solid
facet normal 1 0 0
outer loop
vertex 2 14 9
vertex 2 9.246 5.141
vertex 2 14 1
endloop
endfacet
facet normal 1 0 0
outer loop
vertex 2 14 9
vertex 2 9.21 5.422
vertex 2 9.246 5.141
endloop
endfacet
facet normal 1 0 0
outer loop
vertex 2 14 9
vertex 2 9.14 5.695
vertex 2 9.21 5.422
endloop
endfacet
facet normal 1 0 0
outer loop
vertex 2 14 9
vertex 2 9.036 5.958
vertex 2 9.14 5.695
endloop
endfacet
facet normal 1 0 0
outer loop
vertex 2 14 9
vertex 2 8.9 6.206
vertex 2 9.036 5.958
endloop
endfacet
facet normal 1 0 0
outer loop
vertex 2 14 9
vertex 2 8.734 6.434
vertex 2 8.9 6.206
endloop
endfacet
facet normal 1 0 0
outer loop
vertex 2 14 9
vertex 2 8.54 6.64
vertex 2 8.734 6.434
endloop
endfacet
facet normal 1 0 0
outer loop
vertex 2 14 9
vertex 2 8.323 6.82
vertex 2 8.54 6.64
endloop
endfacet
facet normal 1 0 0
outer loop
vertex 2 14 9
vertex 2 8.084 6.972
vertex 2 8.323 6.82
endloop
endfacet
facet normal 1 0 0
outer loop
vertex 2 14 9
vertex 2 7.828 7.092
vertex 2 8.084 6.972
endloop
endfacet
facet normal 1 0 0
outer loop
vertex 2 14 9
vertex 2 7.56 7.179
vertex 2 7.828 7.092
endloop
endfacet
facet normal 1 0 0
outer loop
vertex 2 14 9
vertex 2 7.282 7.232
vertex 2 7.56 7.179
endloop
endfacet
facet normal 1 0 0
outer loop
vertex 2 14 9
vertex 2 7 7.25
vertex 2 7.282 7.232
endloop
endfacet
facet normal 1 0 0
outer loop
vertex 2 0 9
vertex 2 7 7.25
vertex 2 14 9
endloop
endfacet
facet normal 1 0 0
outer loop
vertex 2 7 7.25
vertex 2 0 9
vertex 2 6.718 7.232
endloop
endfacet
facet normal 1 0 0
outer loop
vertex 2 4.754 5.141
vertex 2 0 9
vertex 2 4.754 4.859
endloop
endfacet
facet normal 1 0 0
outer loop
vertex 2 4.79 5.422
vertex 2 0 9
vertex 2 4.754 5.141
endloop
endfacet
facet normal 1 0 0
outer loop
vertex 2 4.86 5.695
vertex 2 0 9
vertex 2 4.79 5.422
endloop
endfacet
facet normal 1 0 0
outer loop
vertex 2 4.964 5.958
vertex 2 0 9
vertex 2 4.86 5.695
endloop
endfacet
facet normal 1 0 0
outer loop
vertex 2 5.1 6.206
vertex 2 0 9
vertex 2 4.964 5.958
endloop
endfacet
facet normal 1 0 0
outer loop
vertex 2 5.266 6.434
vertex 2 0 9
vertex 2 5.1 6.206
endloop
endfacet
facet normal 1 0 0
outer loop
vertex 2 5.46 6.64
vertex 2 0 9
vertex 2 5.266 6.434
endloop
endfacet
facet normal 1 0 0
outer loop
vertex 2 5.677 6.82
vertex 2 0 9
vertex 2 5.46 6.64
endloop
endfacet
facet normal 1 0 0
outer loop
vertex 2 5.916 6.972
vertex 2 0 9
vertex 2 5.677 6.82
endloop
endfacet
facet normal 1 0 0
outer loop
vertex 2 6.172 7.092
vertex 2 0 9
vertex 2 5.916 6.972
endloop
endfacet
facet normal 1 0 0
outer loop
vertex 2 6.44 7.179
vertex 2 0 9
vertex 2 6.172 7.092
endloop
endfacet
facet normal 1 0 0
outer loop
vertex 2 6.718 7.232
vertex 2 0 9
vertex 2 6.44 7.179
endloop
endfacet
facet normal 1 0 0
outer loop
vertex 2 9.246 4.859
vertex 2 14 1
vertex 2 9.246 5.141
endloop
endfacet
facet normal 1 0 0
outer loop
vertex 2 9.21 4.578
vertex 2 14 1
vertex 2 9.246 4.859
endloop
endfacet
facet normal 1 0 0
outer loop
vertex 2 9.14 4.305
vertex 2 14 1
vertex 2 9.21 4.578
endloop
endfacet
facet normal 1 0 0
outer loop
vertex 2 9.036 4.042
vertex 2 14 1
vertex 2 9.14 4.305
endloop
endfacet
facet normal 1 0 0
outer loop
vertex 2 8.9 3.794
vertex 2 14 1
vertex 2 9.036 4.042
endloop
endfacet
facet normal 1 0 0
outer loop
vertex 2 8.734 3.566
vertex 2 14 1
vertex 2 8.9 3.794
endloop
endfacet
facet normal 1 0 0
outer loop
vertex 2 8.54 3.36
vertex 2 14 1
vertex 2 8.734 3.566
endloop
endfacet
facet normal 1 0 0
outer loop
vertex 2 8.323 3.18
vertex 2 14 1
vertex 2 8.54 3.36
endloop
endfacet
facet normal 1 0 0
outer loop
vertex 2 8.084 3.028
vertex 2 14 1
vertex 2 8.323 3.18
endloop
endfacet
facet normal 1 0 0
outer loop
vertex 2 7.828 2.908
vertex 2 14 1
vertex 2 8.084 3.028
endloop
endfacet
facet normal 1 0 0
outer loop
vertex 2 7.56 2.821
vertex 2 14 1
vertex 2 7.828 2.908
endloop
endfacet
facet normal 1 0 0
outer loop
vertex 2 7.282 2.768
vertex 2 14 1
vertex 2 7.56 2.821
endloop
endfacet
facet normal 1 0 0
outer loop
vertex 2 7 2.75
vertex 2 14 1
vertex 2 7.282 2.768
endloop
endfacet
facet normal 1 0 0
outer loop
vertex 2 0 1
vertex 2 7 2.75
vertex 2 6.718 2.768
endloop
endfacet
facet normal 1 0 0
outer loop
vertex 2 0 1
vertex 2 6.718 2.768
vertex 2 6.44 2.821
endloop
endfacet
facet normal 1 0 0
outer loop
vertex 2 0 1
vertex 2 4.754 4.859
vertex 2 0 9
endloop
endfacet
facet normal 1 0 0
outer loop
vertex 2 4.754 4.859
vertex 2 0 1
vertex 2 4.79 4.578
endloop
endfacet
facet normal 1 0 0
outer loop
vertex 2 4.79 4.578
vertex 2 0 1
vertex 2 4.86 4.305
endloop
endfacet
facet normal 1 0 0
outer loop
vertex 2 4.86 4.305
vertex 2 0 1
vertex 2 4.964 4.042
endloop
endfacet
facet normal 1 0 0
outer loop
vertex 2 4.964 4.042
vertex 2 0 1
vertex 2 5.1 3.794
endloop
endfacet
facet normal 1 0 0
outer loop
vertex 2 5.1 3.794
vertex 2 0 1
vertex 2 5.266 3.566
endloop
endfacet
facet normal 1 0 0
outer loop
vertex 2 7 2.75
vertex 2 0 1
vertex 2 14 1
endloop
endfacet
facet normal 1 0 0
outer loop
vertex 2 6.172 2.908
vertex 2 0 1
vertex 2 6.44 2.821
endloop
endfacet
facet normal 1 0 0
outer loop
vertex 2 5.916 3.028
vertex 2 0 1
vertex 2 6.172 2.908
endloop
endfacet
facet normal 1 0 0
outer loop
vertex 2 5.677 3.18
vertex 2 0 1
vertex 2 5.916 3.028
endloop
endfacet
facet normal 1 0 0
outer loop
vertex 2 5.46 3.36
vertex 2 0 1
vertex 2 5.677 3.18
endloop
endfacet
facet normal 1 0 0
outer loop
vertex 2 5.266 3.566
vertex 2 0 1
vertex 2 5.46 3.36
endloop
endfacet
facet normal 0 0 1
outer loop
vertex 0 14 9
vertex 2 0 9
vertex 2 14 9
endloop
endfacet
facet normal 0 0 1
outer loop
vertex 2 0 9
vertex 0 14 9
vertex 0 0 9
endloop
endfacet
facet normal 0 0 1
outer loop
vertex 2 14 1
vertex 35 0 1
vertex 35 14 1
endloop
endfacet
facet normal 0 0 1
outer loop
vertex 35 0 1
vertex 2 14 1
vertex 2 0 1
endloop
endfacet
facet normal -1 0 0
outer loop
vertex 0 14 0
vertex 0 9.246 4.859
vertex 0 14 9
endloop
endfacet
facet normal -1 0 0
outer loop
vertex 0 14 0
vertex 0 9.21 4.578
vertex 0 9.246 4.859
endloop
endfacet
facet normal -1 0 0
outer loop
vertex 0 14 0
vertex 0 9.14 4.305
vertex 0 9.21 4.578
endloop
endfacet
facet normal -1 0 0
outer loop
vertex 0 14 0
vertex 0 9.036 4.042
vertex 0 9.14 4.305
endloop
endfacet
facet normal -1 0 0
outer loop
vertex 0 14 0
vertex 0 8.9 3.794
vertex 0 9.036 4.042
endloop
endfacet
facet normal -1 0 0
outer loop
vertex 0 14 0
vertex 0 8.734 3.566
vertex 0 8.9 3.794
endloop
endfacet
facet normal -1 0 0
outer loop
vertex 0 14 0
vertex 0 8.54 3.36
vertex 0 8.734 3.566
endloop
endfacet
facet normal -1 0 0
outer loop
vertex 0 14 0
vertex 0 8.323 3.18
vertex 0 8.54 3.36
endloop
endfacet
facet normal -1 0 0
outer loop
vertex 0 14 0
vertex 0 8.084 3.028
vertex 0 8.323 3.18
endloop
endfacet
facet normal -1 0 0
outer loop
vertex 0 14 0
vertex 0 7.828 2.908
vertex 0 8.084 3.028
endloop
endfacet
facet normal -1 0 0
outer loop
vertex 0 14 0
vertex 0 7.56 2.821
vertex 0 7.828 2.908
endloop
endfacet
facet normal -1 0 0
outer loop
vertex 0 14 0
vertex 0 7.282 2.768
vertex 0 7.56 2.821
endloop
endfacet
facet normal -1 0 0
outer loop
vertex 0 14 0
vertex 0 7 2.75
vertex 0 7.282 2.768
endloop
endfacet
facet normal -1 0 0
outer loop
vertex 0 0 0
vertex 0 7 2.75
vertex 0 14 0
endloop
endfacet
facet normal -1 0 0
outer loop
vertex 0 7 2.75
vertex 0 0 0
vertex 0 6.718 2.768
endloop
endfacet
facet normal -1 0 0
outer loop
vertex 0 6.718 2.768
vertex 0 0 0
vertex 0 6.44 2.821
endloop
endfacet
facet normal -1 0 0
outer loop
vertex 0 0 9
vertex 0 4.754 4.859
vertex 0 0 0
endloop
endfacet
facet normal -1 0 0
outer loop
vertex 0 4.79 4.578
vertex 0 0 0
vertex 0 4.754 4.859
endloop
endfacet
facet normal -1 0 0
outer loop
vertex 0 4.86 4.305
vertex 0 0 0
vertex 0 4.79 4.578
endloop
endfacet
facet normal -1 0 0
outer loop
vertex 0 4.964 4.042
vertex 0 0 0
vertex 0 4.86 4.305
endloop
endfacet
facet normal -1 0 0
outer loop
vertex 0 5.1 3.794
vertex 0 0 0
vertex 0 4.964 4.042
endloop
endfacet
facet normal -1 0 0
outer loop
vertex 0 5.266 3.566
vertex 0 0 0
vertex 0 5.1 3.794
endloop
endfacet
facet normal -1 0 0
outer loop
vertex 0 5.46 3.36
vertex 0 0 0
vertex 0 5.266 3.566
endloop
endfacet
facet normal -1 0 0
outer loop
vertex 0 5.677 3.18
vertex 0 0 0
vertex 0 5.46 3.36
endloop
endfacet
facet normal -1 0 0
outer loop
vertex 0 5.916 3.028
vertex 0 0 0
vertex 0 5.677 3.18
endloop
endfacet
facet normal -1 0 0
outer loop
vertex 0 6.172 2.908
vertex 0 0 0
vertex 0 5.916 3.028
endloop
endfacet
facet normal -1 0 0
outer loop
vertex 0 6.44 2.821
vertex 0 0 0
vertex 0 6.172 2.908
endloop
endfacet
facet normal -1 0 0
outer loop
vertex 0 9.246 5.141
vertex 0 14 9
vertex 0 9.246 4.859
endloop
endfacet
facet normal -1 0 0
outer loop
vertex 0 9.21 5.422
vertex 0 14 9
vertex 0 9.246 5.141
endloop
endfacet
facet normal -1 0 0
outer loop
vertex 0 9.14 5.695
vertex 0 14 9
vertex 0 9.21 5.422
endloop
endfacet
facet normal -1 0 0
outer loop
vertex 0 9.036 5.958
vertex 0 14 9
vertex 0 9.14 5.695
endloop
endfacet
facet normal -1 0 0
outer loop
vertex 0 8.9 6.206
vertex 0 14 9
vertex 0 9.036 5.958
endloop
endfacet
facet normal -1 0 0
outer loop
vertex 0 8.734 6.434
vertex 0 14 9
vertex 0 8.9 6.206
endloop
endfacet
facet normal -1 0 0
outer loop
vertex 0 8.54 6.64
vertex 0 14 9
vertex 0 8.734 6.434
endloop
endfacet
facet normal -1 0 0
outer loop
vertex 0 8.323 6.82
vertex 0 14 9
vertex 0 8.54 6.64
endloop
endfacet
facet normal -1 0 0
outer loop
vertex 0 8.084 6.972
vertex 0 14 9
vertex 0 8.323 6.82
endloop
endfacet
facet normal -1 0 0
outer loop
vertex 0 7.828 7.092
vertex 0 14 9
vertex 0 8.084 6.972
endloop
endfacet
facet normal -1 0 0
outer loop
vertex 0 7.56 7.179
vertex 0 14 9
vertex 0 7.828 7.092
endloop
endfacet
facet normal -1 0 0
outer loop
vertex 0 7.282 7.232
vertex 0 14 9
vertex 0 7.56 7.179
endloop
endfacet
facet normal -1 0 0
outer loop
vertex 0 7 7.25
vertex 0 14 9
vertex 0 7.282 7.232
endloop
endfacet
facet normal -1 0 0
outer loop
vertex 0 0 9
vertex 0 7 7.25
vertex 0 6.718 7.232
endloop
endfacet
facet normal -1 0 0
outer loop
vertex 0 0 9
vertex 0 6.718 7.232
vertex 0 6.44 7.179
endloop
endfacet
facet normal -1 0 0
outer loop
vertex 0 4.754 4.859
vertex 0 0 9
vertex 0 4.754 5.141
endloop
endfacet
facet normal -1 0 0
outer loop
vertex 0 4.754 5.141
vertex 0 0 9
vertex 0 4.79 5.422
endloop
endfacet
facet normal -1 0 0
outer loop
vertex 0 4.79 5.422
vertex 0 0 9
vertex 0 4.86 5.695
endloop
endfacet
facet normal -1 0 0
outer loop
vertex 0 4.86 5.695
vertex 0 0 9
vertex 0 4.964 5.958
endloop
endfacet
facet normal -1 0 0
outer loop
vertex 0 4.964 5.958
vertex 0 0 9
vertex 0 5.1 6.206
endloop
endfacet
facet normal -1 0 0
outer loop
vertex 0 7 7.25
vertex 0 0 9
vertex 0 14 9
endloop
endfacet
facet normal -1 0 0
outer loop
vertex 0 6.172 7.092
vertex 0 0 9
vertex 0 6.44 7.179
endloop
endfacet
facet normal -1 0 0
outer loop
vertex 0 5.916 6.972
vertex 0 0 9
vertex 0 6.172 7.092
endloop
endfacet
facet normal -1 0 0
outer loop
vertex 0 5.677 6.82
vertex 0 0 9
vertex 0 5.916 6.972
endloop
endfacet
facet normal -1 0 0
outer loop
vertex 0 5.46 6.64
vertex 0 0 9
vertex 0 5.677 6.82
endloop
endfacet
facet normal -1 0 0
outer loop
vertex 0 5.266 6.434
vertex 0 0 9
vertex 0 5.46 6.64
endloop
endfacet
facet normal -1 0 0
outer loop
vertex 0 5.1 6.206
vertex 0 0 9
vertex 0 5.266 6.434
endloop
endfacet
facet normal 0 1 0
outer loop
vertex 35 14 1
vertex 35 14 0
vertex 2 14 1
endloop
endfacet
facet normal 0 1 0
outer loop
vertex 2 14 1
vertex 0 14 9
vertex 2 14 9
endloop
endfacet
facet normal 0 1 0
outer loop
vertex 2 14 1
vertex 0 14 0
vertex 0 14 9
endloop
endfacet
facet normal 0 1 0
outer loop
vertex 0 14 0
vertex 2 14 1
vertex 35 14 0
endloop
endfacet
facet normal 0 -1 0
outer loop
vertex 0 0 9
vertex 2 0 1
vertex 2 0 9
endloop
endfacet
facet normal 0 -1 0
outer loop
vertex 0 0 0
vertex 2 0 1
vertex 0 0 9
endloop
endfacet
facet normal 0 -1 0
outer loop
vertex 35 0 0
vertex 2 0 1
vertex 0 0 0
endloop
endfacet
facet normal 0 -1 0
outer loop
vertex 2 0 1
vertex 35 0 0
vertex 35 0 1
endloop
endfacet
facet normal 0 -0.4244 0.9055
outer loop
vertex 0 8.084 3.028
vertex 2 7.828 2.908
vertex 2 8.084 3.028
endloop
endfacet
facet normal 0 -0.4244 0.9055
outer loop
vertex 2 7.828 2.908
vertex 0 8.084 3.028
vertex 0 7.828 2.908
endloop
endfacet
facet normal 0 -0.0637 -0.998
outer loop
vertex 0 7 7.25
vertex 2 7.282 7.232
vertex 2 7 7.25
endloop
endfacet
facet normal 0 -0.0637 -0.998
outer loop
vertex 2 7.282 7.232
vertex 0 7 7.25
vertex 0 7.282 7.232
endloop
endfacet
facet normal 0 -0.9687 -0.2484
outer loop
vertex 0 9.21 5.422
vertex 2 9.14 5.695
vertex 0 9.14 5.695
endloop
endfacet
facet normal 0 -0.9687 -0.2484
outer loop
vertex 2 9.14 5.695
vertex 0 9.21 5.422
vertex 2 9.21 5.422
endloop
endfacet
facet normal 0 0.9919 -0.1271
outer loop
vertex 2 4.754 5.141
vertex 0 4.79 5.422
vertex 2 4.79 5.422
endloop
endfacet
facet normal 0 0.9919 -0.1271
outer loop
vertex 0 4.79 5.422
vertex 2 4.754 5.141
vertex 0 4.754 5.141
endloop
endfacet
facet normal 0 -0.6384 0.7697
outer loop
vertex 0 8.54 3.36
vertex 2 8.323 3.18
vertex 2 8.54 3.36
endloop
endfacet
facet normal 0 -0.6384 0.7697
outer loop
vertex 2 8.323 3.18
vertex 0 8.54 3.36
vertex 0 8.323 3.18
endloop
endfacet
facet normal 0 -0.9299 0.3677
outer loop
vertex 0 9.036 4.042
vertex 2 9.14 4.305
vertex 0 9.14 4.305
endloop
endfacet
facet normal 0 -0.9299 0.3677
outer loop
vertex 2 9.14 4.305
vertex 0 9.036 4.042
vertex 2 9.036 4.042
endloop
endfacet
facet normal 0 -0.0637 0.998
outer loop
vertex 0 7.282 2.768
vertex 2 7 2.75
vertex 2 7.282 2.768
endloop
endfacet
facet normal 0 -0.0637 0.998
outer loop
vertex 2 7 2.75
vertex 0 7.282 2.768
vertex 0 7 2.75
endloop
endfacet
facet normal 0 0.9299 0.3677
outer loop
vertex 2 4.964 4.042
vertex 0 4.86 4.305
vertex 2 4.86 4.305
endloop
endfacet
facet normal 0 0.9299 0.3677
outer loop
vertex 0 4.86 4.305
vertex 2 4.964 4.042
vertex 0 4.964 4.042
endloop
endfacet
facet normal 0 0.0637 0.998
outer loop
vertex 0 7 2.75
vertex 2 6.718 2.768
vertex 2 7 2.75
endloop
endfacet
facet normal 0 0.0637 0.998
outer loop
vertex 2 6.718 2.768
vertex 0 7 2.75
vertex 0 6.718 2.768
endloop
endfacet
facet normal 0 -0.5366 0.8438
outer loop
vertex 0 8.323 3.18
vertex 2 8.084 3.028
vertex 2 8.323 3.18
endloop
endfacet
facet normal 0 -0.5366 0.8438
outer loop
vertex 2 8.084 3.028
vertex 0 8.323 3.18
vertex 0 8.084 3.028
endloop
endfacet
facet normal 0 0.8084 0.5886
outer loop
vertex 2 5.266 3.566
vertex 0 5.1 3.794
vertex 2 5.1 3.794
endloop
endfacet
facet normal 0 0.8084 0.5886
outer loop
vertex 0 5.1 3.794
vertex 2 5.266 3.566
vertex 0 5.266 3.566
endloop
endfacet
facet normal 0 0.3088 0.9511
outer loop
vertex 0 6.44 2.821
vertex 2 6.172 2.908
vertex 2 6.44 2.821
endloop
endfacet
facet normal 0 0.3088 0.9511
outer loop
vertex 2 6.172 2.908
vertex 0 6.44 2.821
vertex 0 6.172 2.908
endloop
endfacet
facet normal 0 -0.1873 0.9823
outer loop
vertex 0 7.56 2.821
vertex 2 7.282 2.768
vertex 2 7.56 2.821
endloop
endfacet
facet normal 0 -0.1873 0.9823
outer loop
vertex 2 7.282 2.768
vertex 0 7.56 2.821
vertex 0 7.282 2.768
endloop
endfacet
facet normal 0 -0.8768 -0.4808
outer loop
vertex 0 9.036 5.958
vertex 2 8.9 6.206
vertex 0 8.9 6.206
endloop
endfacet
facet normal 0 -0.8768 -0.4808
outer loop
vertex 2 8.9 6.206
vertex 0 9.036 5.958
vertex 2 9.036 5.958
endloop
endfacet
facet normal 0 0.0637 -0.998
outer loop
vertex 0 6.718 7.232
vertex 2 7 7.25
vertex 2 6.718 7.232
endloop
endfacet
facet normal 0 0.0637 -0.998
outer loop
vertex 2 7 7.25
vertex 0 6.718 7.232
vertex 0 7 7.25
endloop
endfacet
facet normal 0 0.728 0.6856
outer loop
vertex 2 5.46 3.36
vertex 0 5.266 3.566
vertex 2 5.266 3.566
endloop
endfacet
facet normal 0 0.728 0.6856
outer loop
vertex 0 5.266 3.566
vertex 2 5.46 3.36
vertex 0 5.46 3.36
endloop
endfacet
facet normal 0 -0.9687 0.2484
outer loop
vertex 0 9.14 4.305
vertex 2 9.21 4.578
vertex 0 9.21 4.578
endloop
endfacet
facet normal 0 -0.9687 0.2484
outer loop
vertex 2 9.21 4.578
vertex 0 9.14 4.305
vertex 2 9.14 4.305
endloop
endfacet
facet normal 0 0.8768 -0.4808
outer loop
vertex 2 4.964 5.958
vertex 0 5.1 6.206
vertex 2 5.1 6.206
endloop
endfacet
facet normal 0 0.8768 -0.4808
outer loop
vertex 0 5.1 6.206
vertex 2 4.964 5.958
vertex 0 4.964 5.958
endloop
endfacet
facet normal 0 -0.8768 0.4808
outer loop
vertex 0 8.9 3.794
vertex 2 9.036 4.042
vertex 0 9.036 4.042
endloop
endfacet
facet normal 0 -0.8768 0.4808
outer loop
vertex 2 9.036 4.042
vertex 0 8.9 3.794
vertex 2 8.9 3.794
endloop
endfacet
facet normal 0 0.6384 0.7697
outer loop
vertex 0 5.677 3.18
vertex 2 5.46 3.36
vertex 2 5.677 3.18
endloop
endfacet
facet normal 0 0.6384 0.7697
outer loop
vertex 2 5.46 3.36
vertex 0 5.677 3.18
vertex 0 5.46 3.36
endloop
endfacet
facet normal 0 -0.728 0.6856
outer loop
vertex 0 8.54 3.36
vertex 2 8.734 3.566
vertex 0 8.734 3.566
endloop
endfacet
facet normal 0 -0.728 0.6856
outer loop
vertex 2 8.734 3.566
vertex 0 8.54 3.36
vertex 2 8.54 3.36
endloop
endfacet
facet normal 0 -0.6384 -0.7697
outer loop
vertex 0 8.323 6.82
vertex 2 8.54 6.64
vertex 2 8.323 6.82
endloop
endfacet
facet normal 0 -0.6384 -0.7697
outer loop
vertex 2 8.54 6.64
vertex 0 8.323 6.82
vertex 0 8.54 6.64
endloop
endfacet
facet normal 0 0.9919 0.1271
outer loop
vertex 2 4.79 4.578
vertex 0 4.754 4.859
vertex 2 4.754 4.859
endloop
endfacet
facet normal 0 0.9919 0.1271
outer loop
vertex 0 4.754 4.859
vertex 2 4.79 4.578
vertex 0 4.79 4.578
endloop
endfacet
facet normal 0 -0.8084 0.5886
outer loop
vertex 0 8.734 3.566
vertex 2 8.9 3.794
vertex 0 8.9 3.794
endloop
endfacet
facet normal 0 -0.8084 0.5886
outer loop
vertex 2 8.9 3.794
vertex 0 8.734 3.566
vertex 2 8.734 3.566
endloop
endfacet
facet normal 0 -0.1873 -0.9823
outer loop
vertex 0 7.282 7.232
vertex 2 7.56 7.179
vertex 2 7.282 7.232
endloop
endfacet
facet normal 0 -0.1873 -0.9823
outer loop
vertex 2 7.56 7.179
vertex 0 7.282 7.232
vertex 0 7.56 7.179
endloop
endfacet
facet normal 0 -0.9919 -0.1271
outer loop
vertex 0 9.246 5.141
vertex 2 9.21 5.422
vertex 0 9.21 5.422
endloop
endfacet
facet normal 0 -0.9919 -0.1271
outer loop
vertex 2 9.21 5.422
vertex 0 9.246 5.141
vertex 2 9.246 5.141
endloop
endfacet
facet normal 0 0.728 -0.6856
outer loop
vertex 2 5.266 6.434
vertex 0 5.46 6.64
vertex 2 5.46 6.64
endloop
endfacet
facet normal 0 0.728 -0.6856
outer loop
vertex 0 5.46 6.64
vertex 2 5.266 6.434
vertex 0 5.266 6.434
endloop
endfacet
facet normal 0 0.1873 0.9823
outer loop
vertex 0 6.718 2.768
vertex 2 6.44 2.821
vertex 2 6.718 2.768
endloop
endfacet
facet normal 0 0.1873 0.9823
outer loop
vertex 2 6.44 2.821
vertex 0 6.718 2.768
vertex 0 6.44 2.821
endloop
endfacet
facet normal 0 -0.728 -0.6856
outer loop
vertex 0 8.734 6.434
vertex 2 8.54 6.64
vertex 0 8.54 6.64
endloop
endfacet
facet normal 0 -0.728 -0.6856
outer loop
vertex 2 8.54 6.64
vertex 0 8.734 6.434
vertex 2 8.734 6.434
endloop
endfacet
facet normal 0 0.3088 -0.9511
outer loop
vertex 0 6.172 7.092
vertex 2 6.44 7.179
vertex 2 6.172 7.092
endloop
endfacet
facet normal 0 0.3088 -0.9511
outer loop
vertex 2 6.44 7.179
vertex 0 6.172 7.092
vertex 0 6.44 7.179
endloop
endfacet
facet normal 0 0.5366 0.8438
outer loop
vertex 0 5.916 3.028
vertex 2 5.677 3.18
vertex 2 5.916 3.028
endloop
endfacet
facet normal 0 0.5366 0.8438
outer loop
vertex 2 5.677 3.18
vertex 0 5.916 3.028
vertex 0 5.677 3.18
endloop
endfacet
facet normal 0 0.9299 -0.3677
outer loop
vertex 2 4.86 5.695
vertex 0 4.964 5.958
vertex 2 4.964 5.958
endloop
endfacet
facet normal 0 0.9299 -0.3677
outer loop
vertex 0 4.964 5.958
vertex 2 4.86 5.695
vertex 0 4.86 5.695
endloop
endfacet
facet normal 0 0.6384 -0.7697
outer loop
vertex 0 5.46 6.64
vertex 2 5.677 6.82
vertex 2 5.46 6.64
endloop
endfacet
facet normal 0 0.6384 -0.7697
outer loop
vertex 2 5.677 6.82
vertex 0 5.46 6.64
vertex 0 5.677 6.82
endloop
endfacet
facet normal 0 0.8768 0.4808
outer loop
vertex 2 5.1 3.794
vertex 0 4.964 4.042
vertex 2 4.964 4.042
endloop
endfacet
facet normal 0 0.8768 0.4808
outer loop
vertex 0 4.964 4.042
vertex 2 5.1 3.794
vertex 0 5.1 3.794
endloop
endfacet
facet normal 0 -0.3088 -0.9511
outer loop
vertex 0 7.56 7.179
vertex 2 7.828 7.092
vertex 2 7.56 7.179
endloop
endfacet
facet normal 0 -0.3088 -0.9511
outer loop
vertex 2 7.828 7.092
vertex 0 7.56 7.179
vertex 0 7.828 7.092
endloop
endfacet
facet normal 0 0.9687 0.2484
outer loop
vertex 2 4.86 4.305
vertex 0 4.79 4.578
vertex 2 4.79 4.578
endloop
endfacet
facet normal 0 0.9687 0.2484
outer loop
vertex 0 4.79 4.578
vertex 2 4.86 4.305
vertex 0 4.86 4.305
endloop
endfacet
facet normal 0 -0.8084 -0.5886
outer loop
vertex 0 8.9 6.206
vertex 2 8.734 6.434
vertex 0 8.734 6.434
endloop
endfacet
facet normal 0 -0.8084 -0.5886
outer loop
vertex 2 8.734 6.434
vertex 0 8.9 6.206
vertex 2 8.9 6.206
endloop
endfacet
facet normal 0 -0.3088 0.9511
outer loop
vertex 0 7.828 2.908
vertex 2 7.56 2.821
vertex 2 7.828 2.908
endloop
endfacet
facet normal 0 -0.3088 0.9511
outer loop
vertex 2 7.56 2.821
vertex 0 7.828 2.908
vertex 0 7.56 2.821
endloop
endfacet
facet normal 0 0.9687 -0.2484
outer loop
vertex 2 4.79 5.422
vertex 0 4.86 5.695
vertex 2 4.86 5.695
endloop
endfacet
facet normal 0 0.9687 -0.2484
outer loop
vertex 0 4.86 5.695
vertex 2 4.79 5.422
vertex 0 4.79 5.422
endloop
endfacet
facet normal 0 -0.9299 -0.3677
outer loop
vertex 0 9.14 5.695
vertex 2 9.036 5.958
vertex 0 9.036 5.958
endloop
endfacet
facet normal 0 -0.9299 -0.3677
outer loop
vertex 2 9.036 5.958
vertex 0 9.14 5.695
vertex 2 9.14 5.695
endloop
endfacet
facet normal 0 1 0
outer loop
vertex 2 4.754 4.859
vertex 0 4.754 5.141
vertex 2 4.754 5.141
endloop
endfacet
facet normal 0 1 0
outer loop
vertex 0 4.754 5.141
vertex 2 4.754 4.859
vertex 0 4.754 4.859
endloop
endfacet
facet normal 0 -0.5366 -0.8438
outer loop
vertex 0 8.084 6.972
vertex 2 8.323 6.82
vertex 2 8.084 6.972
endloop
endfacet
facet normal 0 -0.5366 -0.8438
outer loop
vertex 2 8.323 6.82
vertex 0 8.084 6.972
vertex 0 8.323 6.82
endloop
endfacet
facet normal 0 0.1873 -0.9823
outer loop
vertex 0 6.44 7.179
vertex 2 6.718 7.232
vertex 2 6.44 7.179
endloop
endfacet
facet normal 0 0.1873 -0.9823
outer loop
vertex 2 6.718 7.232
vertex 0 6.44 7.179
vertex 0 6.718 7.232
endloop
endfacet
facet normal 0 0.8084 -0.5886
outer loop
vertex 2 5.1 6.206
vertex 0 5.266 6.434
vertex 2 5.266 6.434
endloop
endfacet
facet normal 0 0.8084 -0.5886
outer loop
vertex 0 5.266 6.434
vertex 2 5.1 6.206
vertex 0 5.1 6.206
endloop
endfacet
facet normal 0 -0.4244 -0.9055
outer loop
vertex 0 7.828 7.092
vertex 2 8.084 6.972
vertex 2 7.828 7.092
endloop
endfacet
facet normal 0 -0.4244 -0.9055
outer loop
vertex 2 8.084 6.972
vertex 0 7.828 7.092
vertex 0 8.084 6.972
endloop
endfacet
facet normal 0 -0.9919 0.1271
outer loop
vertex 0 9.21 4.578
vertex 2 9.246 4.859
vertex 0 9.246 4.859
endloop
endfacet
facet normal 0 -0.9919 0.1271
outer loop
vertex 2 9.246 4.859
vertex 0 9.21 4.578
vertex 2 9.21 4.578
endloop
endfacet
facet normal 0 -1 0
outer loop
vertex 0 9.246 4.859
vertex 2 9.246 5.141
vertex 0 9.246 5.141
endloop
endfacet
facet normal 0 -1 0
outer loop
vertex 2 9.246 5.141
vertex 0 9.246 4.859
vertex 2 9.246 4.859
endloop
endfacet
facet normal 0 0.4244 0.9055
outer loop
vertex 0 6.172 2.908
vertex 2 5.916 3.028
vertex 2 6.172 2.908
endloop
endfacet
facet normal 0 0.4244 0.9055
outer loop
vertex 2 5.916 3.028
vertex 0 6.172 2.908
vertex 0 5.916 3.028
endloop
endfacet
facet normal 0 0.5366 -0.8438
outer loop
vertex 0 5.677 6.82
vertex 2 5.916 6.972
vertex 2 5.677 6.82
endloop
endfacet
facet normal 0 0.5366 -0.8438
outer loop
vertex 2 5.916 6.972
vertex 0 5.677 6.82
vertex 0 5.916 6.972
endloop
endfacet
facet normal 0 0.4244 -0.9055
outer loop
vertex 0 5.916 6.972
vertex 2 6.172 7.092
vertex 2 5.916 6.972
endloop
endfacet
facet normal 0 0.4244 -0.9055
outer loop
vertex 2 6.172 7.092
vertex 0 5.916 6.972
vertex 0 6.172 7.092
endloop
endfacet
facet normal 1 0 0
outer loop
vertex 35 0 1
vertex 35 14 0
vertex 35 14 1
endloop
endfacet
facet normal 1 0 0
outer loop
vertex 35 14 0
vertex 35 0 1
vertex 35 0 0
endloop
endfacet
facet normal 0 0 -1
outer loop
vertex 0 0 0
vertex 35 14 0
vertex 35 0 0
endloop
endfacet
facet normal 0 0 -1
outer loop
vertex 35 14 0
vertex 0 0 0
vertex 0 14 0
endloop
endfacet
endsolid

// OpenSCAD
/*
 * file: prusa-i3-optostopadapter.scad
 * author: gregor binder <gregor_reprap@catrix.at>
 * date: 9.2.2014
 * last change: 9.2.2014
 * license: CC BY-NC-SA 4.0
 */

hole_d=4.5;
thickness=1;
lenght=35;
mount_thickness=2;
depth=8;
width=14;
$fn=50;

cube([lenght,width,thickness]);
translate([0,0,thickness])
	difference() {
		cube([mount_thickness,width,depth]);
		translate([-0.1,width/2,depth/2])
			rotate([0,90,0])
		cylinder(h=depth+5,r=hole_d/2);
	}
